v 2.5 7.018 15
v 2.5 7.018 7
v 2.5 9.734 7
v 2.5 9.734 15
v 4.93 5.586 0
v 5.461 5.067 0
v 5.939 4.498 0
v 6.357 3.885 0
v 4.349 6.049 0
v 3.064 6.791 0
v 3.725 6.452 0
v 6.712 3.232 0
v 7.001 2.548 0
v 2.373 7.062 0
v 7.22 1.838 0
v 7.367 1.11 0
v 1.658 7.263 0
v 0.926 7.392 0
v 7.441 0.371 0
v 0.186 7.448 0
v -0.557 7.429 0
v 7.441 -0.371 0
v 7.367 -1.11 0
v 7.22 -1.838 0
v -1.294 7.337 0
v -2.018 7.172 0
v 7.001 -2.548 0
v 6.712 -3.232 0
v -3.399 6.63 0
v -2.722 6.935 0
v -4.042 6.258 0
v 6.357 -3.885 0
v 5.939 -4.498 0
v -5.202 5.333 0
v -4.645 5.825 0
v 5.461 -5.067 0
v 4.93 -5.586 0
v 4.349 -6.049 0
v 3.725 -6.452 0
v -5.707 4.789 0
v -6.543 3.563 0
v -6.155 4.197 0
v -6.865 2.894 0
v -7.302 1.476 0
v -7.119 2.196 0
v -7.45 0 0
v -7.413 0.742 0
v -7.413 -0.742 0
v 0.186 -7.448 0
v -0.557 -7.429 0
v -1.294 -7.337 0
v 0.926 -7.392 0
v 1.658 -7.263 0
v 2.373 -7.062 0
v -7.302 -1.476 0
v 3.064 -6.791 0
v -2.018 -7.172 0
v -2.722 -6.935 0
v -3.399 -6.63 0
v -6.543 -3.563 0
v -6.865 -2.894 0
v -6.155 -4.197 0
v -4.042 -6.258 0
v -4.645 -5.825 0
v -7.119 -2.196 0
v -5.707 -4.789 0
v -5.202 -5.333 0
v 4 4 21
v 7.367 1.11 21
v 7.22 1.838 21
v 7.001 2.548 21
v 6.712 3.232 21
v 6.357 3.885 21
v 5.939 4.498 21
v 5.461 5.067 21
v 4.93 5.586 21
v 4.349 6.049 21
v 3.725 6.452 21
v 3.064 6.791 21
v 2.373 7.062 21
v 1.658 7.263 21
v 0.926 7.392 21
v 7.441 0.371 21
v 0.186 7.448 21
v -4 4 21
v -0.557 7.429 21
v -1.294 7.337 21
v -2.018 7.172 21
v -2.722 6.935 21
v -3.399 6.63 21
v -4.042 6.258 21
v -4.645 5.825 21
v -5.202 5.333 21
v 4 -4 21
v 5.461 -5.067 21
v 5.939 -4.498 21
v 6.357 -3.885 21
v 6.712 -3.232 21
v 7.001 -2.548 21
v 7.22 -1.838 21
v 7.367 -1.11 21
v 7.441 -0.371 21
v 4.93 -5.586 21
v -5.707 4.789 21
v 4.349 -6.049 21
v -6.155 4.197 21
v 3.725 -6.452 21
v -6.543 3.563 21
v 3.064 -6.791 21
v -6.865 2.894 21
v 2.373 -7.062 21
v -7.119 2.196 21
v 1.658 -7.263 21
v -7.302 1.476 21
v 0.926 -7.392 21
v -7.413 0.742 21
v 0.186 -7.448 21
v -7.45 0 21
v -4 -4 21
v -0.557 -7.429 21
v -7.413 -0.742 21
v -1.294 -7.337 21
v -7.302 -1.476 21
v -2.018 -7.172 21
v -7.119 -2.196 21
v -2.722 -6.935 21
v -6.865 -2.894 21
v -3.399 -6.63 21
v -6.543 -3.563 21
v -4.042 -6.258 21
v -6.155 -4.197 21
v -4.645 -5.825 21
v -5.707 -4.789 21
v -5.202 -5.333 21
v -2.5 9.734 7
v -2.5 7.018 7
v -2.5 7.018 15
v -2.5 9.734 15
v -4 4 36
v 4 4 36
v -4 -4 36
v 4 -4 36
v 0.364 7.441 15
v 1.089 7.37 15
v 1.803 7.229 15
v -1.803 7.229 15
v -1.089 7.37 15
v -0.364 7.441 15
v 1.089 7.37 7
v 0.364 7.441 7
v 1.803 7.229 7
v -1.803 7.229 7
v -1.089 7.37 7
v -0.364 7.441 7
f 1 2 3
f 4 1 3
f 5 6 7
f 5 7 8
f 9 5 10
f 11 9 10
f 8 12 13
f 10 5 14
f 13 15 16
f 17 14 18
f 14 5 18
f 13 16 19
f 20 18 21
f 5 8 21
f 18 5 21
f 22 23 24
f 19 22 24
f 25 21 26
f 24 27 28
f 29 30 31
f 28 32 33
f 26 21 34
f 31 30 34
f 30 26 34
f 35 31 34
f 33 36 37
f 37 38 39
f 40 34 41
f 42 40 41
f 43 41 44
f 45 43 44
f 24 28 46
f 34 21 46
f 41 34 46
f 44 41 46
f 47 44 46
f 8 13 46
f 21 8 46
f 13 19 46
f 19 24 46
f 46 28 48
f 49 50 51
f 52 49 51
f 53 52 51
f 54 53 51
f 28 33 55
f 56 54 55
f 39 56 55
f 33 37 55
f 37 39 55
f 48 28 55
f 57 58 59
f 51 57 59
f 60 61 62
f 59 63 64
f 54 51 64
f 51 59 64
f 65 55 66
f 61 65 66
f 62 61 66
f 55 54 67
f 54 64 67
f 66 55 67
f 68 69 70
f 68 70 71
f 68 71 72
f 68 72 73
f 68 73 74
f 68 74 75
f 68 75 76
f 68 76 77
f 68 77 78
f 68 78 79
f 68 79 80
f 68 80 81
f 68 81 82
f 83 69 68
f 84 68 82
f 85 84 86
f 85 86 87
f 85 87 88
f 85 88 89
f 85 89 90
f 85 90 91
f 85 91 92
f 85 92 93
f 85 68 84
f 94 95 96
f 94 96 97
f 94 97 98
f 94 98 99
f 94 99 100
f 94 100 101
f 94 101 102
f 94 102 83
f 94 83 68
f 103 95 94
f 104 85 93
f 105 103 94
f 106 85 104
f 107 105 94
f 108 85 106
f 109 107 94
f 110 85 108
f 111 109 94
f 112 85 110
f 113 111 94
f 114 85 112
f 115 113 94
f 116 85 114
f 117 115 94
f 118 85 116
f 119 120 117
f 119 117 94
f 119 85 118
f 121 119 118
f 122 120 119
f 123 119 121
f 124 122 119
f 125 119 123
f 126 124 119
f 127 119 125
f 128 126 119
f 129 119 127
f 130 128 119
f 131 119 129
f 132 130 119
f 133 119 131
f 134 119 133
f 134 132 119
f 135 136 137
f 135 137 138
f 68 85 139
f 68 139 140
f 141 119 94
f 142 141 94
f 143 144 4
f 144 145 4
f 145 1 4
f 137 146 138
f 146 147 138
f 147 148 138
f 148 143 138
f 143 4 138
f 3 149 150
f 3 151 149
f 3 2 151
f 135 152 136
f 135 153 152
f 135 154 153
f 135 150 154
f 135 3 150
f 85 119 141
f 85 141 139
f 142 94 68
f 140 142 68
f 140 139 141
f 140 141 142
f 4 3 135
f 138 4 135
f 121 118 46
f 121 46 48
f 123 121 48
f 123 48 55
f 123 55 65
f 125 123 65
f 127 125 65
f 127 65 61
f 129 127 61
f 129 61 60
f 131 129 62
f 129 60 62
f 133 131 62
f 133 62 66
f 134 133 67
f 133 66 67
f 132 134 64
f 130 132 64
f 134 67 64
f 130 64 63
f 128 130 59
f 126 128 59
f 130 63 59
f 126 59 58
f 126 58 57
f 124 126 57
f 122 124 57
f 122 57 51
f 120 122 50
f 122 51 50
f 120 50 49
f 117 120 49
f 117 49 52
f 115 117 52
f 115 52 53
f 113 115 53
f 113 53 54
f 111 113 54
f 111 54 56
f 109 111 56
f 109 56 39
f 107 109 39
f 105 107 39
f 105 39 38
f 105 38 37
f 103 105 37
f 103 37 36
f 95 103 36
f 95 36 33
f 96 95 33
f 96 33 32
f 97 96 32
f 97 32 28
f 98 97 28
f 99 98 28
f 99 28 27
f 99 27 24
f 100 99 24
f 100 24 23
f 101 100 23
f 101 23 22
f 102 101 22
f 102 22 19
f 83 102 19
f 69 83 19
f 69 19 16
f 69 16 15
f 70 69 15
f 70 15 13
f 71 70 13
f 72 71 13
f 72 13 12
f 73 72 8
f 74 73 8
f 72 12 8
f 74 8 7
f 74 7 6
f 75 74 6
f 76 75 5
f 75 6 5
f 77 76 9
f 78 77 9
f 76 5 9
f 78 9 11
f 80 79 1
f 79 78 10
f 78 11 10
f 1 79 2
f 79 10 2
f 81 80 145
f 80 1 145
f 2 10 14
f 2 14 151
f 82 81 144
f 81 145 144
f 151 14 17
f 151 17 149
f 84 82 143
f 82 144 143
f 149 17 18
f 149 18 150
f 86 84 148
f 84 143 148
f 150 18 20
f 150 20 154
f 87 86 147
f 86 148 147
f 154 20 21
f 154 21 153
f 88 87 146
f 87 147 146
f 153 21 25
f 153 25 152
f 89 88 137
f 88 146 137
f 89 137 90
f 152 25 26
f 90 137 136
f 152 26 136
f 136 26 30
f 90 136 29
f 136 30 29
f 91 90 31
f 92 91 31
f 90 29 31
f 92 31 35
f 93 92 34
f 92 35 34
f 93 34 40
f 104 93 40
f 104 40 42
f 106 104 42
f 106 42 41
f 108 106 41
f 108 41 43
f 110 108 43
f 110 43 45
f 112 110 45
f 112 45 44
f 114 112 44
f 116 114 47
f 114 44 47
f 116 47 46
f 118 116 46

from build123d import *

# Parameters (mm, degrees)
SKETCH1_R           = 7.45
BOSS_EXTRUDE1_DEPTH = 21
BOSS_EXTRUDE4_START = -7
SKETCH4_W           = 5
SKETCH4_H           = 9.734089582
BOSS_EXTRUDE4_DEPTH = 8
SKETCH5_W           = 8
SKETCH5_H           = 8
BOSS_EXTRUDE5_DEPTH = 15


with BuildPart() as part:
    # Sketch1 → Boss-Extrude1 (new body)
    with BuildSketch(Plane.XY):
        with Locations(Location((0, 0, 0), (0, 0, 180))):
            Circle(SKETCH1_R)
    extrude(amount=BOSS_EXTRUDE1_DEPTH)

    # Sketch4 → Boss-Extrude4 (add)
    with BuildSketch(Plane(origin=(0, 0, 0), x_dir=(-1, 0, 0), z_dir=(0, 0, -1)).offset(BOSS_EXTRUDE4_START)):
        with Locations((0, 4.867044791)):
            Rectangle(SKETCH4_W, SKETCH4_H)
    extrude(amount=-BOSS_EXTRUDE4_DEPTH)

    # Sketch5 → Boss-Extrude5 (add)
    with BuildSketch(Plane.XY.offset(21)):
        Rectangle(SKETCH5_W, SKETCH5_H)
    extrude(amount=BOSS_EXTRUDE5_DEPTH)


solid = part.part
